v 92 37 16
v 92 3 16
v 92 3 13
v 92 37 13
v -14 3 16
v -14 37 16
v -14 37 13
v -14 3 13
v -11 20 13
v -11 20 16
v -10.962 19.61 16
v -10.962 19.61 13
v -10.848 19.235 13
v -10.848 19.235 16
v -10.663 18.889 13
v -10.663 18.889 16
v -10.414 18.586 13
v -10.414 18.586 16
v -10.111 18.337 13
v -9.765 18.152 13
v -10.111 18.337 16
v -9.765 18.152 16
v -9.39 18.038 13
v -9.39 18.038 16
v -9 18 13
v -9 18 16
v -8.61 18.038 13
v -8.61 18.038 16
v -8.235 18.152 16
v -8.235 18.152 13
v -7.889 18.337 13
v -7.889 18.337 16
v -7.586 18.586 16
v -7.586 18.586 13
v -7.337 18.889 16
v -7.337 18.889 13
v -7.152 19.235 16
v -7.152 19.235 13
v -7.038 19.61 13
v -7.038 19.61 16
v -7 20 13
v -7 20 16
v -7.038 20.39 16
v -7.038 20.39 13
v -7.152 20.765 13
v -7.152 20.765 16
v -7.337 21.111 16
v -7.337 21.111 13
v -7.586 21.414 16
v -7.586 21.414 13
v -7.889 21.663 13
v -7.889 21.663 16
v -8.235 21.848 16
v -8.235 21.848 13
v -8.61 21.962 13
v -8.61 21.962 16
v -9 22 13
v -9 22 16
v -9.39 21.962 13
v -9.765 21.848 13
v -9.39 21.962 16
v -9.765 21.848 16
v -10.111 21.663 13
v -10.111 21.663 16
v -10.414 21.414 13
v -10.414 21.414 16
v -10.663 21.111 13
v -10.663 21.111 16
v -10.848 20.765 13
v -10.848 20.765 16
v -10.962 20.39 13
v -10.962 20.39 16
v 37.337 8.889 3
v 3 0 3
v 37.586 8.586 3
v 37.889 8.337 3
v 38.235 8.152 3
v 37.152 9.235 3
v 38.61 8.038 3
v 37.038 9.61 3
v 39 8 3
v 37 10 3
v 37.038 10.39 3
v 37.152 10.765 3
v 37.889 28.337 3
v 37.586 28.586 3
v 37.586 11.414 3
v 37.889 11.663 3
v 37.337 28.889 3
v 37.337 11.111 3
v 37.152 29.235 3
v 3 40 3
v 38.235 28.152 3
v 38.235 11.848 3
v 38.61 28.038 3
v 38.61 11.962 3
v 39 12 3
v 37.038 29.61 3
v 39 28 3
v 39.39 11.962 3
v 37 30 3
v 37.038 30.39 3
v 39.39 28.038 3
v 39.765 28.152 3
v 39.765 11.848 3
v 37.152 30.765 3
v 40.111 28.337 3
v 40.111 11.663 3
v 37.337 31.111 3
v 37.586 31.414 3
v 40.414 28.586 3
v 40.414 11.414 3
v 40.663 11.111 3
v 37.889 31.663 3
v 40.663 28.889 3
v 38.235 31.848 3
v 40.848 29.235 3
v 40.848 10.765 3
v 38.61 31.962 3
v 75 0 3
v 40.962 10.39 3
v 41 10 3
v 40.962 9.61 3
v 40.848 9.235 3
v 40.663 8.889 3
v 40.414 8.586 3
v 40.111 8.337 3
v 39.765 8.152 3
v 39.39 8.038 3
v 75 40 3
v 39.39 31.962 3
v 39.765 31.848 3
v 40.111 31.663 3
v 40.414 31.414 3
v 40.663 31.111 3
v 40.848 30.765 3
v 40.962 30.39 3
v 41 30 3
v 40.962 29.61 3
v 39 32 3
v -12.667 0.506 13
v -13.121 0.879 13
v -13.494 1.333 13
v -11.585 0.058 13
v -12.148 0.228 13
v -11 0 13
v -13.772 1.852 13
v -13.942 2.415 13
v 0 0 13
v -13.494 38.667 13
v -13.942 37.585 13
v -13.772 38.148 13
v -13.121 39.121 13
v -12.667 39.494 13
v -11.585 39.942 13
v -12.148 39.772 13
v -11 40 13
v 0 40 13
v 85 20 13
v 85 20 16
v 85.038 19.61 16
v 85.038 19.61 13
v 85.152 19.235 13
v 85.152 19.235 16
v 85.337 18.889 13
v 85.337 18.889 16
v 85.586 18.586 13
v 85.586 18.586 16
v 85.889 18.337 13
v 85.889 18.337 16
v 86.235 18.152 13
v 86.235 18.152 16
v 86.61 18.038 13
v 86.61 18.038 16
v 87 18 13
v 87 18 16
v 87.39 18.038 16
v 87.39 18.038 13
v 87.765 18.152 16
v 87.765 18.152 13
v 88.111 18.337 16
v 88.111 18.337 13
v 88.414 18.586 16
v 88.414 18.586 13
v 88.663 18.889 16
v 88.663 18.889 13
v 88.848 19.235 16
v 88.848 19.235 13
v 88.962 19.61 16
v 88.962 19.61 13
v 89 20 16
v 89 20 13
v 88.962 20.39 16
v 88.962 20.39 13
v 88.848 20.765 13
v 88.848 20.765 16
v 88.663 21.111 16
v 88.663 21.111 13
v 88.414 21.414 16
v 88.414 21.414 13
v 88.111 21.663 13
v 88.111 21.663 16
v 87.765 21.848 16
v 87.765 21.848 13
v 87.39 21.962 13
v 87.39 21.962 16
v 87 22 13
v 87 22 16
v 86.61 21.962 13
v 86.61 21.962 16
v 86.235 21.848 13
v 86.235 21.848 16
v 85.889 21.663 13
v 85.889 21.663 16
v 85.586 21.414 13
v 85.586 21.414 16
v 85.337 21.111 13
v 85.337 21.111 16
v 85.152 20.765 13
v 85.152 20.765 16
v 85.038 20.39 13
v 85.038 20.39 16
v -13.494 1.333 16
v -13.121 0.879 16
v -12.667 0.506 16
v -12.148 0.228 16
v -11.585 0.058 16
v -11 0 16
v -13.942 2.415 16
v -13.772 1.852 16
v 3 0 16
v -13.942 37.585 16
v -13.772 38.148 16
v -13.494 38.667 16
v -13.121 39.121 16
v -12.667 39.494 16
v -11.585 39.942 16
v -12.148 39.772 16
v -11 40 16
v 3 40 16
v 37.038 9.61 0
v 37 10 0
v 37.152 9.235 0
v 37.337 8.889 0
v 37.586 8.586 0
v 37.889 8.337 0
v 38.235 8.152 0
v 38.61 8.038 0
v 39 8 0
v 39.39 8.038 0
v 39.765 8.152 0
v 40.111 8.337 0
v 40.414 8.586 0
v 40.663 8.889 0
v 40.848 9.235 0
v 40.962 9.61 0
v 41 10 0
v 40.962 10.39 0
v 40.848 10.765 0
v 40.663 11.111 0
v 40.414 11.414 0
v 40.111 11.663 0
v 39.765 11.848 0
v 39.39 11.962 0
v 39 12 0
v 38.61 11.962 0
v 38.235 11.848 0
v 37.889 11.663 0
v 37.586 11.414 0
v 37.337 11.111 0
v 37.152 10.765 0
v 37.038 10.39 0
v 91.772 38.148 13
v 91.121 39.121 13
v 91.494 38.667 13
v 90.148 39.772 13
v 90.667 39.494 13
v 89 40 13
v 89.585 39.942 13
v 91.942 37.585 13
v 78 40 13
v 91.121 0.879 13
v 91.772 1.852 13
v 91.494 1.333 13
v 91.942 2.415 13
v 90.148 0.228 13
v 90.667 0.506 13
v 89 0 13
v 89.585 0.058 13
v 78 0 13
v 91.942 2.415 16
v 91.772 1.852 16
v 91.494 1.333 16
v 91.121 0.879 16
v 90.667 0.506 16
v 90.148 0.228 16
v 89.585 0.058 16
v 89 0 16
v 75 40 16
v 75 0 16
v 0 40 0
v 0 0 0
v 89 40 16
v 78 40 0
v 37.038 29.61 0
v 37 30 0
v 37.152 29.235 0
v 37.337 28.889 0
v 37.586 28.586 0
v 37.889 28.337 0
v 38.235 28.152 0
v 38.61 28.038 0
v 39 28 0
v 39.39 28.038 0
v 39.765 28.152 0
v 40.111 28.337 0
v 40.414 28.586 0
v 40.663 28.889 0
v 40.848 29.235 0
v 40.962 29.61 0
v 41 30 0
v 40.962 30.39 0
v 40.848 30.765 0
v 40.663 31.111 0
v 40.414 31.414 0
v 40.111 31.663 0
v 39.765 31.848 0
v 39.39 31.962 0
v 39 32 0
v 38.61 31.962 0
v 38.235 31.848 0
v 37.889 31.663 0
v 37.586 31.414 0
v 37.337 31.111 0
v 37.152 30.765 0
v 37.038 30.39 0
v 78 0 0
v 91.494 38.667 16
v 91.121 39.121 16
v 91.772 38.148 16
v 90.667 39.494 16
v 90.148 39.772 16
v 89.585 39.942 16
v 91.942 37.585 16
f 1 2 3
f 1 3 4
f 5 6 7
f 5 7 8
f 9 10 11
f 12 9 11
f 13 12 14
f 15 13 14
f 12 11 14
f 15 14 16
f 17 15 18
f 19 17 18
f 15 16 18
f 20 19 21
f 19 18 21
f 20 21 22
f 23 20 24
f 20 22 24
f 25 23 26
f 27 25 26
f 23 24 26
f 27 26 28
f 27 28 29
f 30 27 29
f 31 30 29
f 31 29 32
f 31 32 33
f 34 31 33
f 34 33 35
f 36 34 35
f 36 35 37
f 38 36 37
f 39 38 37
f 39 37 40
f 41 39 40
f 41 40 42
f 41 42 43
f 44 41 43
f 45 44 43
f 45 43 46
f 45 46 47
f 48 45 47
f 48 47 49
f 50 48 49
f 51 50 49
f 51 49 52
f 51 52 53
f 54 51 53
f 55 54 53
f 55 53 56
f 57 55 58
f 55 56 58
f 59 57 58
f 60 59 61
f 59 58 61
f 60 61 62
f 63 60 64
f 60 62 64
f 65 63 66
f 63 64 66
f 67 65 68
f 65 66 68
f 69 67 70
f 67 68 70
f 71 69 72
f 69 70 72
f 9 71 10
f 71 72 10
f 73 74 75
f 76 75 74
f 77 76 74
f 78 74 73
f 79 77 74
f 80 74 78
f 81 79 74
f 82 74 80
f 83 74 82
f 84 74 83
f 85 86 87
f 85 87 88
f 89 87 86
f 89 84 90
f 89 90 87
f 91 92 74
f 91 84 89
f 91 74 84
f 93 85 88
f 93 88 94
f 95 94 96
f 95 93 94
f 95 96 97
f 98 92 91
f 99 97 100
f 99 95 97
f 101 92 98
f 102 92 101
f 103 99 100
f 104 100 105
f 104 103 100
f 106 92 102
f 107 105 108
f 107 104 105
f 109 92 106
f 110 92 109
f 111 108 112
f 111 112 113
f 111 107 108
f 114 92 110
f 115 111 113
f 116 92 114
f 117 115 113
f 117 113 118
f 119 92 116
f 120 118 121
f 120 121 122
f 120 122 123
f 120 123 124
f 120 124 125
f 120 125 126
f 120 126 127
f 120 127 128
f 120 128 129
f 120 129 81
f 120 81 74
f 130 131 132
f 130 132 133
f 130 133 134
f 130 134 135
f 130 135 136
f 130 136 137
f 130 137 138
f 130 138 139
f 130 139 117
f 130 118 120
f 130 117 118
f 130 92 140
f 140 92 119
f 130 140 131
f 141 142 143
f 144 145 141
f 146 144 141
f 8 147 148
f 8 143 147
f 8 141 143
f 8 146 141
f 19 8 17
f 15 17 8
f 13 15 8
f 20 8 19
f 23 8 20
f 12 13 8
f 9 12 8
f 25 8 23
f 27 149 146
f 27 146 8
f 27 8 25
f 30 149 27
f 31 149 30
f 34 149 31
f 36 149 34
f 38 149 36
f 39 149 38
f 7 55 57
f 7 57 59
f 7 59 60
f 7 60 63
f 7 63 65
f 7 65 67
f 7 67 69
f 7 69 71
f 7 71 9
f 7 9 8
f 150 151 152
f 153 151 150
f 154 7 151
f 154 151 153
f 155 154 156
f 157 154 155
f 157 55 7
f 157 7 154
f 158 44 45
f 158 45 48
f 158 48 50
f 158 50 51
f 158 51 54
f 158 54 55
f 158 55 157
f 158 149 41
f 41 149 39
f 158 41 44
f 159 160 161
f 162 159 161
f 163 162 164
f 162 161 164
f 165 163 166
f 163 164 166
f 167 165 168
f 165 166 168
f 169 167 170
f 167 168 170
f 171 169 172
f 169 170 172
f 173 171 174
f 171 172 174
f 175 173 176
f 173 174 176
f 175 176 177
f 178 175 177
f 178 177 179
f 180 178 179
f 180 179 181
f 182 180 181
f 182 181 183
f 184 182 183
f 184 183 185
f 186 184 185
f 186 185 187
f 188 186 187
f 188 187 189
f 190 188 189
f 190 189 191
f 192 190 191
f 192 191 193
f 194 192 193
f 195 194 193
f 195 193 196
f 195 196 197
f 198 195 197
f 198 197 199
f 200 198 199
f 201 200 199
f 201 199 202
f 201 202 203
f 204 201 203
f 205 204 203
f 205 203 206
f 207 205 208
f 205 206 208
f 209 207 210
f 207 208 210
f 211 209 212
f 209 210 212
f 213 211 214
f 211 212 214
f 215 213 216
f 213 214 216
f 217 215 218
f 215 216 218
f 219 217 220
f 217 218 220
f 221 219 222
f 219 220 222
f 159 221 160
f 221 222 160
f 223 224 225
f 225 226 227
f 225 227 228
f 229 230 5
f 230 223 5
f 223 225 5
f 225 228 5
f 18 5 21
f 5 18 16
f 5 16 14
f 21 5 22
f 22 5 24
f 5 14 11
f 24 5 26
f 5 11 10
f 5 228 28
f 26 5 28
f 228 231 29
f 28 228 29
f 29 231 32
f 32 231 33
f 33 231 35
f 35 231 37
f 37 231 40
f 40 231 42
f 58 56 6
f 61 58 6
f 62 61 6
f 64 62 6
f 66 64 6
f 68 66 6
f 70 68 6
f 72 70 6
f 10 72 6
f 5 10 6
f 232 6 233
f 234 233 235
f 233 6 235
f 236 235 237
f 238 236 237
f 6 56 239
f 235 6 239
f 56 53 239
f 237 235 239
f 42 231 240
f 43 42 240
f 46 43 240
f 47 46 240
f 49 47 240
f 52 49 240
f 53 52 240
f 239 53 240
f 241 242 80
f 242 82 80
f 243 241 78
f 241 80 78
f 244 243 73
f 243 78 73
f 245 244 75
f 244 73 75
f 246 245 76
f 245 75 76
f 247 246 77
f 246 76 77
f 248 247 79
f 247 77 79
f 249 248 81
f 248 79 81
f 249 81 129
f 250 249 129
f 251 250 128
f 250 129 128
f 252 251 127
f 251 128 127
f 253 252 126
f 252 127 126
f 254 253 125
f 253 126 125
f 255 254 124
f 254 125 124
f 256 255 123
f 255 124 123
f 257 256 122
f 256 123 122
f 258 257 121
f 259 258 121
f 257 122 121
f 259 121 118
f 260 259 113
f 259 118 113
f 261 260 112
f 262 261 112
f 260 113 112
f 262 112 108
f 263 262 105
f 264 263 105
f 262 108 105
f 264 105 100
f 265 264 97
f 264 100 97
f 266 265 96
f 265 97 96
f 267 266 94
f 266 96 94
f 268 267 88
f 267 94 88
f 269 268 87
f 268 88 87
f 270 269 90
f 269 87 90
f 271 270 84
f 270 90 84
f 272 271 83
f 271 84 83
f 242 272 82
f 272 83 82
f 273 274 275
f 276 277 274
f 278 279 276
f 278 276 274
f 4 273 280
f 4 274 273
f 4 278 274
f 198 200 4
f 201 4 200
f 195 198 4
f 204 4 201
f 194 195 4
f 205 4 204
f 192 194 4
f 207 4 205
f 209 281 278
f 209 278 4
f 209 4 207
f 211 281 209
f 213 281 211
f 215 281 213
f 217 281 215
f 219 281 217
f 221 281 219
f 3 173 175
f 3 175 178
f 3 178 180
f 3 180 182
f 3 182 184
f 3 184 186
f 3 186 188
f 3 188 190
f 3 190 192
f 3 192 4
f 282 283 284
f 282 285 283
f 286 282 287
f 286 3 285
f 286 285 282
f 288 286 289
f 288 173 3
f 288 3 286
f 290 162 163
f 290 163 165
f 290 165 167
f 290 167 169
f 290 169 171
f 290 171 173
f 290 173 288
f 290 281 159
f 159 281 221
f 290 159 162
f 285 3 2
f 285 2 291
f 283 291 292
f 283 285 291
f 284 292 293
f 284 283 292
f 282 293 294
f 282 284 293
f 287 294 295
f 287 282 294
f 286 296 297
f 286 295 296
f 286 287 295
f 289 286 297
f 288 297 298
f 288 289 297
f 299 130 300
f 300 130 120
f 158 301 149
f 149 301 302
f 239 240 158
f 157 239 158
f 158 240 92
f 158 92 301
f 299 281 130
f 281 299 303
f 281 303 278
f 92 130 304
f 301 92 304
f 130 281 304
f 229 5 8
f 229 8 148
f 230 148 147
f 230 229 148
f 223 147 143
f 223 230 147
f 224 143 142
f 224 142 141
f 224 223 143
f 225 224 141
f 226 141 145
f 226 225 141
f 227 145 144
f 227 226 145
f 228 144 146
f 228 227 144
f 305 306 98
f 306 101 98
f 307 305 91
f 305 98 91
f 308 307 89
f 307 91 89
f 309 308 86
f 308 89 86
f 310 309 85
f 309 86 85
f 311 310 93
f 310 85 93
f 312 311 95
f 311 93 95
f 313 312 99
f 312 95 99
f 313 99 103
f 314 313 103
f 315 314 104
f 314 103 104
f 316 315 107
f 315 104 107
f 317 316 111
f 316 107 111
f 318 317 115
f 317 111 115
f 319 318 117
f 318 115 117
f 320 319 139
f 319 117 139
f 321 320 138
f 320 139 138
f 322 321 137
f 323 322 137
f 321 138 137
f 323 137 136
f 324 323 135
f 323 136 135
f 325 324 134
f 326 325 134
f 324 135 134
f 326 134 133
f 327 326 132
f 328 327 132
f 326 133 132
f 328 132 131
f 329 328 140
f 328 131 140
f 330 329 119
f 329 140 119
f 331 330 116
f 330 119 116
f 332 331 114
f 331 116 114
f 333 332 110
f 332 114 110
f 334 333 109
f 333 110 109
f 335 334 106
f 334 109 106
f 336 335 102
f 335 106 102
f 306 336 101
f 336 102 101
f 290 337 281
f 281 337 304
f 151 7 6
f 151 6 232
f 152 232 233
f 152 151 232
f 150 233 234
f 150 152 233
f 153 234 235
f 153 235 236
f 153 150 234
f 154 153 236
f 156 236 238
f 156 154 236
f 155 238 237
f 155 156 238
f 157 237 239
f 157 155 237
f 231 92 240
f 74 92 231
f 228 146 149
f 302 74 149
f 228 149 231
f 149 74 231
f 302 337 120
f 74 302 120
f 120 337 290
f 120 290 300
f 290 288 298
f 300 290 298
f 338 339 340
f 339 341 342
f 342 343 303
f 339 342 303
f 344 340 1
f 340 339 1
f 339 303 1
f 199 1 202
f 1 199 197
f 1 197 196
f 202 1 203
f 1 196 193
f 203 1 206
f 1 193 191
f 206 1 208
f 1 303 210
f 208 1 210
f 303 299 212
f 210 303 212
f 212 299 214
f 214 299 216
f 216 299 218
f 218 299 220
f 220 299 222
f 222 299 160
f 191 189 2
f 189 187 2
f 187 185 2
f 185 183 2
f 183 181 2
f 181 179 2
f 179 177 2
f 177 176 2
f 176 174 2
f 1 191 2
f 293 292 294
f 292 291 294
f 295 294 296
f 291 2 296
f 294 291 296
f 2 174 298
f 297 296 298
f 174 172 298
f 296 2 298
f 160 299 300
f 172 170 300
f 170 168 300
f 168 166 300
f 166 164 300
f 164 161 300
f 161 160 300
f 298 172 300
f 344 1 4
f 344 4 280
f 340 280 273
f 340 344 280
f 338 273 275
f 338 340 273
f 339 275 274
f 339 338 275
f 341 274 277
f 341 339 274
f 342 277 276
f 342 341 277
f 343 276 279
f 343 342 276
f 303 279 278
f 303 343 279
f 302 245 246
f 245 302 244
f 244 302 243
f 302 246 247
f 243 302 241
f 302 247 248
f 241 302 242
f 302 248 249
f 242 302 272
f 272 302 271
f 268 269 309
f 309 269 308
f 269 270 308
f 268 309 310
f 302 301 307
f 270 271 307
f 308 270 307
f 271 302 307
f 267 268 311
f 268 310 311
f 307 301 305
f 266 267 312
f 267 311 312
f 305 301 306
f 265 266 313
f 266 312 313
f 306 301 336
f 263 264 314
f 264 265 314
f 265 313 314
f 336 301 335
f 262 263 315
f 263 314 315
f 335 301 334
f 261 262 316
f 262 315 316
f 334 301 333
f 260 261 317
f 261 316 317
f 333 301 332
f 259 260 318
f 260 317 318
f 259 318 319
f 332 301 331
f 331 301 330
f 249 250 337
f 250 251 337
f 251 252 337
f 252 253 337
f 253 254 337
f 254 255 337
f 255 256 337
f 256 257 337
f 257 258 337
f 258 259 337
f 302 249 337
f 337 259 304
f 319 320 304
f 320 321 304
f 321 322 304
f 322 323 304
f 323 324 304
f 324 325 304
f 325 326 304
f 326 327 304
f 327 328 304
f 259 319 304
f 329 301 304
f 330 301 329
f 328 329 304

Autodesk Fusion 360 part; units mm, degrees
sketch "Sketch1" plane through (0, 0, 0) normal (0, 0, 1) x (1, 0, 0)
  line L0 (0, 0) -> (78, 0)
  line L1 (78, 0) -> (78, 40)
  line L2 (78, 40) -> (0, 40)
  line L3 (0, 40) -> (0, 0)
  dimension "d1" = 78
  dimension "d2" = 40
extrude "Extrude1" add sketch "Sketch1" along normal blind 3
sketch "Sketch3" plane through (0, 0, 3) normal (0, 0, 1) x (-1, 0, 0)
  line L0 (0, -40) -> (0, 0)
  line L1 (0, 0) -> (-78, 0)
  line L2 (-78, 0) -> (-78, -40)
  line L3 (-78, -40) -> (0, -40)
  line L4 (0, -40) -> (-3, -40)
  line L5 (-3, -40) -> (-3, 0)
  line L6 (0, 0) -> (0, -40)
  dimension "d5" = 3
extrude "Extrude2" add sketch "Sketch3" along normal blind 13 contours L0 L1 L3 L4 L5 L6
sketch "Sketch4" plane through (0, 0, 3) normal (0, 0, 1) x (-1, 0, 0)
  line L0 (-3, -40) -> (-3, 0)
  line L1 (-3, 0) -> (-78, 0)
  line L2 (-78, 0) -> (-78, -40)
  line L3 (-78, -40) -> (-3, -40)
  line L4 (-78, -40) -> (-75, -40)
  line L5 (-75, -40) -> (-75, 0)
  line L6 (-78, 0) -> (-78, -40)
  dimension "d8" = 3
extrude "Extrude3" add sketch "Sketch4" along normal blind 13 contours L1 L2 L3 L4 L5 L6
sketch "Sketch5" plane through (78, 0, 0) normal (1, 0, 0) x (0, 1, 0)
  line L0 (0, 0) -> (40, 0)
  line L1 (40, 0) -> (40, 16)
  line L2 (40, 16) -> (0, 16)
  line L3 (0, 16) -> (0, 0)
  line L4 (40, 16) -> (40, 13)
  line L5 (40, 13) -> (0, 13)
  line L6 (0, 13) -> (0, 16)
extrude "Extrude4" add sketch "Sketch5" along normal blind 14 contours L1 L2 L3 L4 L5 L6
sketch "Sketch6" plane through (0, 0, 0) normal (-1, 0, 0) x (0, -1, 0)
  line L0 (-40, 0) -> (0, 0)
  line L1 (0, 0) -> (0, 16)
  line L2 (0, 16) -> (-40, 16)
  line L3 (-40, 16) -> (-40, 0)
  line L4 (-40, 16) -> (0, 16)
  line L5 (0, 16) -> (0, 13)
  line L6 (0, 13) -> (-40, 13)
  line L7 (-40, 13) -> (-40, 16)
extrude "Extrude5" add sketch "Sketch6" along normal blind 14 contours L1 L2 L3 L4 L5 L6 L7
sketch "Sketch7" plane through (0, 0, 16) normal (0, 0, 1) x (-1, 0, 0)
  line L0 (14, 0) -> (-3, 0)
  line L1 (-3, 0) -> (-3, -40)
  line L2 (-3, -40) -> (14, -40)
  line L3 (14, -40) -> (14, 0)
  circle A0 centre (9, -20) radius 2
  dimension "d15" = 4
extrude "Extrude6" cut sketch "Sketch7" against normal blind 3 contours A0
sketch "Sketch8" plane through (0, 0, 16) normal (0, 0, 1) x (-1, 0, 0)
  line L0 (-92, -40) -> (-75, -40)
  line L1 (-75, -40) -> (-75, 0)
  line L2 (-75, 0) -> (-92, 0)
  line L3 (-92, 0) -> (-92, -40)
  line L4 (-92, -20) -> (-87, -20)
  circle A0 centre (-87, -20) radius 2
  dimension "d18" = 4
extrude "Extrude7" cut sketch "Sketch8" against normal blind 3 contours A0
fillet "Fillet1" radius 3 1 edges at (-14, 0, 14.5)
fillet "Fillet2" radius 3 1 edges at (-14, 40, 14.5)
fillet "Fillet3" radius 3 1 edges at (92, 0, 14.5)
fillet "Fillet4" radius 3 1 edges at (92, 40, 14.5)
sketch "Sketch9" plane through (0, 0, 3) normal (0, 0, 1) x (-1, 0, 0)
  line L0 (-75, 0) -> (-75, -40)
  line L1 (-75, -40) -> (-3, -40)
  line L2 (-3, -40) -> (-3, 0)
  line L3 (-3, 0) -> (-75, 0)
  line L4 (-39, -40) -> (-39, 0)
  line L5 (-3, -20) -> (-75, -20)
  circle A0 centre (-39, -30) radius 2
  circle A1 centre (-39, -10) radius 2
  dimension "d25" = 4
  dimension "d26" = 4
  dimension "d27" = 10
  dimension "d28" = 10
extrude "Extrude8" cut sketch "Sketch9" against normal blind 3 contours L4 A1 | L4 A1 | L4 A0 | L4 A0
